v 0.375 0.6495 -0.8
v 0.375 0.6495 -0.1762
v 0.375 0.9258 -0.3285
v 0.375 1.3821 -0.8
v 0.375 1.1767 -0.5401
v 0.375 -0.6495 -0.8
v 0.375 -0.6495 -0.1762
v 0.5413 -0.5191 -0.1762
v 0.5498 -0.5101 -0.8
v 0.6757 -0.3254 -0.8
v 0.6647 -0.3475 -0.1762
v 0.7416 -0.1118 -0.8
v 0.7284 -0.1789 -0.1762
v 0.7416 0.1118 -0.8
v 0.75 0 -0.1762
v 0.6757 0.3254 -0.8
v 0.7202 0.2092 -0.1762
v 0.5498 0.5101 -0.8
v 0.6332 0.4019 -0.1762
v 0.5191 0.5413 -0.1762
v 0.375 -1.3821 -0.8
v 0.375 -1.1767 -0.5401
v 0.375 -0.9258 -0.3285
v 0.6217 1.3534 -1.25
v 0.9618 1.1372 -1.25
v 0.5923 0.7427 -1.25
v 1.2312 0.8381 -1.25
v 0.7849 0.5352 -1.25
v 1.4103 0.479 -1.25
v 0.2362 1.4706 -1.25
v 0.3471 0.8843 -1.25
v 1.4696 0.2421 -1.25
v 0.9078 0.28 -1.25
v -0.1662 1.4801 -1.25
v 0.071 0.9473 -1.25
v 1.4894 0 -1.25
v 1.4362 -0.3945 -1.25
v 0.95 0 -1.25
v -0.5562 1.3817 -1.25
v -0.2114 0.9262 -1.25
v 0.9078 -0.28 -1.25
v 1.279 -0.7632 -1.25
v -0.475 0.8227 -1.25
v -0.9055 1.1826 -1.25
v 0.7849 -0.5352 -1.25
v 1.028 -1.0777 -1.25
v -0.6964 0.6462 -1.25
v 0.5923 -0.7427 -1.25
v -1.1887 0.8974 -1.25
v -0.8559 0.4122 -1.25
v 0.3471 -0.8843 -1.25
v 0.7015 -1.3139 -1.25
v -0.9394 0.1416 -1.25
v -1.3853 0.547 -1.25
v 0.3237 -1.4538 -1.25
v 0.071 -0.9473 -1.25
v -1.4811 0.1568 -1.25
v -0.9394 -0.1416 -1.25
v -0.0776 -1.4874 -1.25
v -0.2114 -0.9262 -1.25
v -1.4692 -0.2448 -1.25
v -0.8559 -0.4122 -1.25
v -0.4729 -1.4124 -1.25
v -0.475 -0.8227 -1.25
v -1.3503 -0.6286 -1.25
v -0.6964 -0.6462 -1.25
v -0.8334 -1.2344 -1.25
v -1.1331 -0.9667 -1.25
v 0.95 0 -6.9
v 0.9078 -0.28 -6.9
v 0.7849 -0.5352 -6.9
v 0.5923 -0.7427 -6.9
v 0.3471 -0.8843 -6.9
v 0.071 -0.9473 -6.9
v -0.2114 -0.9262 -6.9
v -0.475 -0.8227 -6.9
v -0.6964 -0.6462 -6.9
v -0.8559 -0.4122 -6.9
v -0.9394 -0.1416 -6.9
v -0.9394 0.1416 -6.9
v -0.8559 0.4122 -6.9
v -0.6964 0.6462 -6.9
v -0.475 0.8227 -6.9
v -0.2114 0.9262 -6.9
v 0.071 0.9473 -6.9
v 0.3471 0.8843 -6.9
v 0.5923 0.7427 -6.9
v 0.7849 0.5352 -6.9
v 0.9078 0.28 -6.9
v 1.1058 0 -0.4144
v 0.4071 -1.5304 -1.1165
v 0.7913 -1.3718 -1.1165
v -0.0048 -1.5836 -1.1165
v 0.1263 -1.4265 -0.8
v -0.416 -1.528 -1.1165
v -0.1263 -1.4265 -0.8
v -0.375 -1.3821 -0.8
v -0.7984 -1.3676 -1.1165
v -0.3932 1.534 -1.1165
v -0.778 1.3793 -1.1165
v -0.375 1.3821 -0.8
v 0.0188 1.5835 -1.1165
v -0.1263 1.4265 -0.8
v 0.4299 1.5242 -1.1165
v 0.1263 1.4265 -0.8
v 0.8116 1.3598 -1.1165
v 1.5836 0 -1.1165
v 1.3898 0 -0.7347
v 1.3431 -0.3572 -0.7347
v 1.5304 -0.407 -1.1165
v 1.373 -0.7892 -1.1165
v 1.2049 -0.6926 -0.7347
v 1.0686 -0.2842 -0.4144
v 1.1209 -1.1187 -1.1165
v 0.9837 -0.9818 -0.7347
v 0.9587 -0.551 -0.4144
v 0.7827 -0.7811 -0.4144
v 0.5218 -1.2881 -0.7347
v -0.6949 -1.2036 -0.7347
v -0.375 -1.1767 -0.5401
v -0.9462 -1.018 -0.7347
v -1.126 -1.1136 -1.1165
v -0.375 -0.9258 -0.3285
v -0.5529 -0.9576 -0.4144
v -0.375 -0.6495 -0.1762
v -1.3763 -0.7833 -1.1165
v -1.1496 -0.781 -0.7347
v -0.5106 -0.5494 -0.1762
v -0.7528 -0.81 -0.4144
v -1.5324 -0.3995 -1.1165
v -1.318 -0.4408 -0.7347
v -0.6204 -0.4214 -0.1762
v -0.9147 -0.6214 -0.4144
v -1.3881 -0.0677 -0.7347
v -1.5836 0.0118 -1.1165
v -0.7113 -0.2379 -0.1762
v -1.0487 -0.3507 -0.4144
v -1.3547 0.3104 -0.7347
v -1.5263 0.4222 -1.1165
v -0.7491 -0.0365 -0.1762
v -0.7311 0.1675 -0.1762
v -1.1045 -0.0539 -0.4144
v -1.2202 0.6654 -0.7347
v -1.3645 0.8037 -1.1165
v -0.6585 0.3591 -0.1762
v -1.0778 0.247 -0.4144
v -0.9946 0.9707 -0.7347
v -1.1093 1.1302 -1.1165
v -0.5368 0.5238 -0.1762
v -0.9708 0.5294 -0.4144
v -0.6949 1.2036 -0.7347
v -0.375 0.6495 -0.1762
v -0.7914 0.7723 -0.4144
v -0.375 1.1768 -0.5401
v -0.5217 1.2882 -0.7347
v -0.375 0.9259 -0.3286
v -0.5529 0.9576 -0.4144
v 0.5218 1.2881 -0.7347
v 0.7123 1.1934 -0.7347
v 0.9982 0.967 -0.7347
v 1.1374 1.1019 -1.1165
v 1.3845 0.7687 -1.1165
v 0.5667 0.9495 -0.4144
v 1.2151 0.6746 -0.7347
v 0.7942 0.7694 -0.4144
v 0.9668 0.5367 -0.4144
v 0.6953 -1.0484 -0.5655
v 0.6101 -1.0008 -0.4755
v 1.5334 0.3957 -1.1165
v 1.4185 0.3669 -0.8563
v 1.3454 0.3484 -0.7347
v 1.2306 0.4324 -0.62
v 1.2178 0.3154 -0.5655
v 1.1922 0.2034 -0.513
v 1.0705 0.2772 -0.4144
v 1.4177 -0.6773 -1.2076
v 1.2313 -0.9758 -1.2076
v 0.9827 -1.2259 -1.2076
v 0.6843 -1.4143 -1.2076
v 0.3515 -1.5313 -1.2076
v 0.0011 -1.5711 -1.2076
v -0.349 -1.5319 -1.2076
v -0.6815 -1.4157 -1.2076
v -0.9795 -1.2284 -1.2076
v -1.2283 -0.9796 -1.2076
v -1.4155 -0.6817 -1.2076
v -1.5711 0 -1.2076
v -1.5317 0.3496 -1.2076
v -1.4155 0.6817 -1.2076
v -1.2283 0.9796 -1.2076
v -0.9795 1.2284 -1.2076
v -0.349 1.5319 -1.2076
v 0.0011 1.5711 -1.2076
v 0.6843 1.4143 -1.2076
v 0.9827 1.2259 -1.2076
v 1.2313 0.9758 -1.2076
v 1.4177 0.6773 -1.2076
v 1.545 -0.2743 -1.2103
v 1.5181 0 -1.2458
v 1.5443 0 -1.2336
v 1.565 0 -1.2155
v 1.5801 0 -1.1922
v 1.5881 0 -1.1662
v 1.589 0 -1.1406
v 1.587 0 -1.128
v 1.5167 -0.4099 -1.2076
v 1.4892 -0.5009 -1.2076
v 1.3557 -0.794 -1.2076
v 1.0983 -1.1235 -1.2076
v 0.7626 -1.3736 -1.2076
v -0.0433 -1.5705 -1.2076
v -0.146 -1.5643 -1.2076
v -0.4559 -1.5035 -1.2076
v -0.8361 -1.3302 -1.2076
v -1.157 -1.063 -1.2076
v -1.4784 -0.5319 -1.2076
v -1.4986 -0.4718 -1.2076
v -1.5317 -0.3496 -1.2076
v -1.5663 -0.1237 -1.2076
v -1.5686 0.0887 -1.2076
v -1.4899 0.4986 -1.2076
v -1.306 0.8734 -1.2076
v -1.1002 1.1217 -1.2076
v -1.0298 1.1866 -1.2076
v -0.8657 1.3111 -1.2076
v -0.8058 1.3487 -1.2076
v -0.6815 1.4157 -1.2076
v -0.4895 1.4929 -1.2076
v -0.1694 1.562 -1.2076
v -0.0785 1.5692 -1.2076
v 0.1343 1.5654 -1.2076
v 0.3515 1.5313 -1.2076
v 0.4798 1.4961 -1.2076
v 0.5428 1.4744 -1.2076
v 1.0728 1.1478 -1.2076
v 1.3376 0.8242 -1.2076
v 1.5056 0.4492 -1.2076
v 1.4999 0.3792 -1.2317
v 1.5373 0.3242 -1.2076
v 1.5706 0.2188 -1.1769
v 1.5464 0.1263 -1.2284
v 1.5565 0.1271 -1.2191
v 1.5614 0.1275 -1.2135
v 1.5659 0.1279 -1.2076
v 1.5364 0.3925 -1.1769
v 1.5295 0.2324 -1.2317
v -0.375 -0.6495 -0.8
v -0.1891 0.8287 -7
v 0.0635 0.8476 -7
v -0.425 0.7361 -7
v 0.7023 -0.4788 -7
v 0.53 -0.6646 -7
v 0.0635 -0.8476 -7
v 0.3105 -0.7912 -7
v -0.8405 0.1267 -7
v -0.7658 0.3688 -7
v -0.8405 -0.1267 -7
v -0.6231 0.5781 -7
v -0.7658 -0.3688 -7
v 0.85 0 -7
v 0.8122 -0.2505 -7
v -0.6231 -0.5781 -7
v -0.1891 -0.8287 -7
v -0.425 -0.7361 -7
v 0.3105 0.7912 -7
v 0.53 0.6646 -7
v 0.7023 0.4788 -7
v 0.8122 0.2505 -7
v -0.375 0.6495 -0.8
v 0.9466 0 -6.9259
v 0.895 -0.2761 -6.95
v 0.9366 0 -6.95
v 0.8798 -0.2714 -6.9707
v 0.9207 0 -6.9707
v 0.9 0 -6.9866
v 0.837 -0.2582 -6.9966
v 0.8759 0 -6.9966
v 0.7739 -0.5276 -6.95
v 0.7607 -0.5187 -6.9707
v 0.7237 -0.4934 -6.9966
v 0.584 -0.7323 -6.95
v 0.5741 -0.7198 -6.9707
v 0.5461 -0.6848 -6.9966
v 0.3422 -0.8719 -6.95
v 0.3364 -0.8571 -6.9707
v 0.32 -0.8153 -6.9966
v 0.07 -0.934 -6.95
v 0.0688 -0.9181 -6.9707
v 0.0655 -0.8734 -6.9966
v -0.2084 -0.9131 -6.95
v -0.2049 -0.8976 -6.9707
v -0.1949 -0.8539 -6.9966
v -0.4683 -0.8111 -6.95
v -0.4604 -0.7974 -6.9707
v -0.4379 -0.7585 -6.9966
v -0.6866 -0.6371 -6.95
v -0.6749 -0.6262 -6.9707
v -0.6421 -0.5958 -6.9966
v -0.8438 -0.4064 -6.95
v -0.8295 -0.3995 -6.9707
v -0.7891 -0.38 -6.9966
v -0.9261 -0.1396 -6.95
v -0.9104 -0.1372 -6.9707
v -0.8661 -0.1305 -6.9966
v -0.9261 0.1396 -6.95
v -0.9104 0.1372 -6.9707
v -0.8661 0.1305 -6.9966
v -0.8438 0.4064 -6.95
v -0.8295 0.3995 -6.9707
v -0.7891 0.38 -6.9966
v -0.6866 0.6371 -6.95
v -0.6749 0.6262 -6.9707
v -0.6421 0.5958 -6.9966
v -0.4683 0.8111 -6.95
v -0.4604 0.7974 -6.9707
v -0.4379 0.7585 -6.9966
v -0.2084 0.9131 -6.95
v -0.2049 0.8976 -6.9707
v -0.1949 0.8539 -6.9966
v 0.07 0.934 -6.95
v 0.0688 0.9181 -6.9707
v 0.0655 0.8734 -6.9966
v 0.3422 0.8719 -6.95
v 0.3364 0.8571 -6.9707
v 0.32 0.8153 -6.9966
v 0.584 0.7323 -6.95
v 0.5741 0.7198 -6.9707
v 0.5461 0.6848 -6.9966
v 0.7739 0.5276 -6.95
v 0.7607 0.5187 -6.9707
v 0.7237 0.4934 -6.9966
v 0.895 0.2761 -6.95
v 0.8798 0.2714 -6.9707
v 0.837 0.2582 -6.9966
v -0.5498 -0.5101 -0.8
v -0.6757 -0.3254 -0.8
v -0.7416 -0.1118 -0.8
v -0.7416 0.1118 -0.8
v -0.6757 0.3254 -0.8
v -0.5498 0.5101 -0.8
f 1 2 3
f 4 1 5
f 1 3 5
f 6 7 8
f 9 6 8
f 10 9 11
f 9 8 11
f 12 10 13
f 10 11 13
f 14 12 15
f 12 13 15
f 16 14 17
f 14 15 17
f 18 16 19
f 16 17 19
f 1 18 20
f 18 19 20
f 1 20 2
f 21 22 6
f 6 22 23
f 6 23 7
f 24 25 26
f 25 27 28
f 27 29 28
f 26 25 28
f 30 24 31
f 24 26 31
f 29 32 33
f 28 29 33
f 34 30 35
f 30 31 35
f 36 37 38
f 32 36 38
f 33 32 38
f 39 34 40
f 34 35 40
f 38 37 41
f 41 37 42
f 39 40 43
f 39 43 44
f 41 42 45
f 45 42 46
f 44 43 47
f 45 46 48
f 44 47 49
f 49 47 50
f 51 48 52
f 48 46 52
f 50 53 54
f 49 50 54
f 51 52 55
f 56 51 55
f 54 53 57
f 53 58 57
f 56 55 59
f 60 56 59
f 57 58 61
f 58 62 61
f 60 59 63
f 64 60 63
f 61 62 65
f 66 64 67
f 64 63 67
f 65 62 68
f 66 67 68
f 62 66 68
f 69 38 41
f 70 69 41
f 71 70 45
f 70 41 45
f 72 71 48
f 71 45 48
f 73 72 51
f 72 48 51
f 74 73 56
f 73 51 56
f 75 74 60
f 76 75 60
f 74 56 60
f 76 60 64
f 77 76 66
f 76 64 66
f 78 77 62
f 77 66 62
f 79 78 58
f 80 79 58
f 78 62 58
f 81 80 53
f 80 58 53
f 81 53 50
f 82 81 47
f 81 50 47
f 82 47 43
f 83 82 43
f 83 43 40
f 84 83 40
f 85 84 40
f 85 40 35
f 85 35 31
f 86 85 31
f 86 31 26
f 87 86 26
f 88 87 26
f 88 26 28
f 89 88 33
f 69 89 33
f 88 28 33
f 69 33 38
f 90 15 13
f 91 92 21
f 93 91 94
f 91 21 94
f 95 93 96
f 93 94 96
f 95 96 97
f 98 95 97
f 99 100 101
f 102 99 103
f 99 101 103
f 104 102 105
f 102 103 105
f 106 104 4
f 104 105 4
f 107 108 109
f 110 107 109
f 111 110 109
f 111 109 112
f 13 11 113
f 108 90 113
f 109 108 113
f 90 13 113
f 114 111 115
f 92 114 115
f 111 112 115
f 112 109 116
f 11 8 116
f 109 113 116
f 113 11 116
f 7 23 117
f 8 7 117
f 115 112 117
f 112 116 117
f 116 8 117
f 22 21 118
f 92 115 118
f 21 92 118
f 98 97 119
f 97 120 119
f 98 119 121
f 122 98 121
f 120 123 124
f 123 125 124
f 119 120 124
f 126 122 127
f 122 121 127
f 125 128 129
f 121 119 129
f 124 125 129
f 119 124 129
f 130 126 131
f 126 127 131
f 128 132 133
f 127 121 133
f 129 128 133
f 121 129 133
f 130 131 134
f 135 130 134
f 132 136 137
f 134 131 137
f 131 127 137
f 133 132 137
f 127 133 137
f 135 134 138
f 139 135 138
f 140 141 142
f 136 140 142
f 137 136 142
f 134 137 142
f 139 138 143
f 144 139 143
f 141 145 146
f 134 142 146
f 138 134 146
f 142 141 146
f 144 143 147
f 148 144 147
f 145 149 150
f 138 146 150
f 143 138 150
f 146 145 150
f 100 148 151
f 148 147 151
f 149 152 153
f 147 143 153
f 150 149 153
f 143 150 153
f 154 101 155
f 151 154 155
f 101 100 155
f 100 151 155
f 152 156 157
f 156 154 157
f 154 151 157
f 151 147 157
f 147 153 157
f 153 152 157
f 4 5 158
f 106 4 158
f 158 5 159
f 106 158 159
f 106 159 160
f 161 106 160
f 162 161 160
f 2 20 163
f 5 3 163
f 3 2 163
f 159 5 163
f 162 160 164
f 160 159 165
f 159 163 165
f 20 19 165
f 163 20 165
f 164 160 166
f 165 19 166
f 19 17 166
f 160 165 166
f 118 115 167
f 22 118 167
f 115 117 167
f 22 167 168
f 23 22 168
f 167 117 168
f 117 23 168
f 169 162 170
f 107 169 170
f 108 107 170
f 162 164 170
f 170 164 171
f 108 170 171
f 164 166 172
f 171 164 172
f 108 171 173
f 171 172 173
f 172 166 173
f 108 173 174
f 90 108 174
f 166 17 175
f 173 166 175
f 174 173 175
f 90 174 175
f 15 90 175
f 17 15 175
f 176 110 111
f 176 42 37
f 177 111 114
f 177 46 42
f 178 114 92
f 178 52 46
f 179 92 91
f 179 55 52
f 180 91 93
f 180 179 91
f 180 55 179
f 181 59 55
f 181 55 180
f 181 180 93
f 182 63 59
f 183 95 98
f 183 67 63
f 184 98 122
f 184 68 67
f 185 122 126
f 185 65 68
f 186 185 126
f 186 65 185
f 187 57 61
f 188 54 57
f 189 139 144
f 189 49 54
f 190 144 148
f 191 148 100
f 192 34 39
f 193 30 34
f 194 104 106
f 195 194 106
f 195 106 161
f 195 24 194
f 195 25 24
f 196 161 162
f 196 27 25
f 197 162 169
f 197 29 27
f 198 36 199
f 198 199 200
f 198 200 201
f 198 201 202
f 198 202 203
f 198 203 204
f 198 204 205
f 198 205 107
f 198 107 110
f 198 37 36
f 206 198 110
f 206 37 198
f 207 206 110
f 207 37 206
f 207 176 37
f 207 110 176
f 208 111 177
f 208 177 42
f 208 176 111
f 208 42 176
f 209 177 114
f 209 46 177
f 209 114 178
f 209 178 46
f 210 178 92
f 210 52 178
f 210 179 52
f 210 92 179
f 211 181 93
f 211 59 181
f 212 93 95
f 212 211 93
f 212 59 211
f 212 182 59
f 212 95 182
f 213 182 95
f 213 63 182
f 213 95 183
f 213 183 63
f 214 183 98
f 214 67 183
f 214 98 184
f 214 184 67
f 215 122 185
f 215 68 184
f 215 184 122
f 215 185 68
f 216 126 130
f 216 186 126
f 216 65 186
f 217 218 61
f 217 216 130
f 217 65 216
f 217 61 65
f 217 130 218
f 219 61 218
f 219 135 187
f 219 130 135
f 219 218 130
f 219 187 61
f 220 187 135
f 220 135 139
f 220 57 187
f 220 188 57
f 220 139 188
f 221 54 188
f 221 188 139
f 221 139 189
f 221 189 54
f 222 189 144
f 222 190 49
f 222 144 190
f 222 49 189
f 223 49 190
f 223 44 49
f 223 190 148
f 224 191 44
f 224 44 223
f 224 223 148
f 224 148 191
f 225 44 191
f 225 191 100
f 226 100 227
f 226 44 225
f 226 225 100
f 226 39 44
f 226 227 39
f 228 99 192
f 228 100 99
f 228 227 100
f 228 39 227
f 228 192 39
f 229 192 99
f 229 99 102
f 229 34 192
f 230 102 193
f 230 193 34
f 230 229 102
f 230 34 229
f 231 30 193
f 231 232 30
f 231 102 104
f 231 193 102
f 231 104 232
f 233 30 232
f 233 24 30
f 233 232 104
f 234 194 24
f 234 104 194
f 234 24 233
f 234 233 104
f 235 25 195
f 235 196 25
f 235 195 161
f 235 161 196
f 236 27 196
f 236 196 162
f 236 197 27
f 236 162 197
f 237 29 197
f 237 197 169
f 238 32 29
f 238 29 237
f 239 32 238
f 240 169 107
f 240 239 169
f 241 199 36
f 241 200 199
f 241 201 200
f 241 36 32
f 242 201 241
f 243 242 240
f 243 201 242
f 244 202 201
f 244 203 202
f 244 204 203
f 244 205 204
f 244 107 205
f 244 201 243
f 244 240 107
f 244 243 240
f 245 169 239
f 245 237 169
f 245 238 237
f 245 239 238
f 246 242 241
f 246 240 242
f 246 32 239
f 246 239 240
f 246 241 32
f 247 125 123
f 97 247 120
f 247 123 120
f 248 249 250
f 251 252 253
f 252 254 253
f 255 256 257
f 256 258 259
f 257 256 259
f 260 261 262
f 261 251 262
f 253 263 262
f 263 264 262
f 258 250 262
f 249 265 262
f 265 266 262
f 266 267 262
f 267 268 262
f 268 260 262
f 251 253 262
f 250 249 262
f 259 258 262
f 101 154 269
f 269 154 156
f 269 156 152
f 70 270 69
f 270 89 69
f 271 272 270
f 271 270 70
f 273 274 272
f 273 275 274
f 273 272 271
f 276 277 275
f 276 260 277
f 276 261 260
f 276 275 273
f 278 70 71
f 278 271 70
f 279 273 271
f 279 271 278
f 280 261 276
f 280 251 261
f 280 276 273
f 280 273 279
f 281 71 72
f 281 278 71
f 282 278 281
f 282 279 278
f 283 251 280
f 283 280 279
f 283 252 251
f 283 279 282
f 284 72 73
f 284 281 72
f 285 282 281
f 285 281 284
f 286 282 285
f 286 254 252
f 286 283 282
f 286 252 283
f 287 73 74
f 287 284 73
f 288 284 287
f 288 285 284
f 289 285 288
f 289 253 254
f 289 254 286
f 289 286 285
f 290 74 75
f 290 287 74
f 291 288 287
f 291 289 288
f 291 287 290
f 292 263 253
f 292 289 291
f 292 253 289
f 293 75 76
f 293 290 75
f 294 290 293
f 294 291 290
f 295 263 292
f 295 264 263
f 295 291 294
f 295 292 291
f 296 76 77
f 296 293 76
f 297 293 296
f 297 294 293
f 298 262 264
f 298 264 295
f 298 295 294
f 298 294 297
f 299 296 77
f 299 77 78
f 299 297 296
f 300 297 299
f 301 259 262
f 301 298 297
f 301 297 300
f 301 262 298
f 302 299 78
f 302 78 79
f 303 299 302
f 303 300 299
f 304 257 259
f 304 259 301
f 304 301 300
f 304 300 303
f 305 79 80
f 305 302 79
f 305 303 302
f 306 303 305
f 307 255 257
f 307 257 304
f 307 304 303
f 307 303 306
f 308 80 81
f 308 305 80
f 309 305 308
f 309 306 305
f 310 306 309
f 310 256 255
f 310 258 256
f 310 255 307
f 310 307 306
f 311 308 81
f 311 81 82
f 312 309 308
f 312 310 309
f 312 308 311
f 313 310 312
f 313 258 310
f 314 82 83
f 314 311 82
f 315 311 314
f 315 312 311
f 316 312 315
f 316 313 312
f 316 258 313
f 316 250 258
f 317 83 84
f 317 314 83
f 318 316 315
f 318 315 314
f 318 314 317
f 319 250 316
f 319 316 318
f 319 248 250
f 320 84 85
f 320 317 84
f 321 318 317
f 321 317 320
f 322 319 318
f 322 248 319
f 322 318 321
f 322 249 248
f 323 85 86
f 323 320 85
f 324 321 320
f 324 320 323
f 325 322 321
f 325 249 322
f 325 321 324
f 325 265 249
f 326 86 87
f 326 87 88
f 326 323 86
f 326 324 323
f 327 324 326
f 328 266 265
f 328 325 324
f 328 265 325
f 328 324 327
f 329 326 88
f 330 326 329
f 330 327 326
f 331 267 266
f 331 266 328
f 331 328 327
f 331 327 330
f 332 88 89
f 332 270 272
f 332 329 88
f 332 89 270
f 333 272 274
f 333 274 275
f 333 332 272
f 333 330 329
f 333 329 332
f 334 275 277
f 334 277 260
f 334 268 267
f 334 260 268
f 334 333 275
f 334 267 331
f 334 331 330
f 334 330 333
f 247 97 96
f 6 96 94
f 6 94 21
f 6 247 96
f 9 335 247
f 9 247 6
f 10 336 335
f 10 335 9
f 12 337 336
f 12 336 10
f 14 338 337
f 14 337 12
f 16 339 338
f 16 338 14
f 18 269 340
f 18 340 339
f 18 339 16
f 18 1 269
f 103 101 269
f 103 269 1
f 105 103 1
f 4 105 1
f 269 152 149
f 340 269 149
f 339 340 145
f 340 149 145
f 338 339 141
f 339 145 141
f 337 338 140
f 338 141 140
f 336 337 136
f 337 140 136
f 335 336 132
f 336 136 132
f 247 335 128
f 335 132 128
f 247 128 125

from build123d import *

# Parameters (mm, degrees)
CUT_EXTRUDE1_DEPTH = 0.8
FILLET1_R          = 0.1
FILLET2_R          = 0.1


with BuildPart() as part:
    # Sketch1 → Revolve1 (revolve)
    with BuildSketch(Plane(origin=(0, 0, 0), x_dir=(0, 0, -1), z_dir=(1, 0, 0)), mode=Mode.PRIVATE) as revolve1_sk:
        with BuildLine():
            Line((0, 0), (7, 0))
            Line((7, 0), (7, 0.95))
            Line((7, 0.95), (1.25, 0.95))
            Line((1.25, 0.95), (1.25, 1.625))
            ThreePointArc((1.25, 1.625), (0.348391423, 1.025275828), (0, 0))
        make_face()
    revolve(revolve1_sk.sketch.rotate(Axis((0, 0, 0), (0, 0, -1)), 90), axis=Axis((0, 0, 0), (0, 0, -1)))

    # Sketch2 → Cut-Extrude1 (cut)
    with BuildSketch(Plane.XY):
        with BuildLine():
            Line((-0.375, -2.059291796), (0.375, -2.059291796))
            Line((0.375, -2.059291796), (0.375, -0.649519053))
            ThreePointArc((0.375, -0.649519053), (0.75, 0), (0.375, 0.649519053))
            Line((0.375, 0.649519053), (0.375, 2.059291796))
            Line((0.375, 2.059291796), (-0.375, 2.059291796))
            Line((-0.375, 2.059291796), (-0.375, 0.649519053))
            ThreePointArc((-0.375, 0.649519053), (-0.75, 0), (-0.375, -0.649519053))
            Line((-0.375, -0.649519053), (-0.375, -2.059291796))
        make_face()
    extrude(amount=-CUT_EXTRUDE1_DEPTH, mode=Mode.SUBTRACT)

    # Fillet1
    fillet1_edges = [part.edges().sort_by_distance(p)[0] for p in [
        (-1.625, 0, -1.25),
    ]]
    fillet(fillet1_edges, radius=FILLET1_R)

    # Fillet2
    fillet2_edges = [part.edges().sort_by_distance(p)[0] for p in [
        (-0.95, 0, -7),
    ]]
    fillet(fillet2_edges, radius=FILLET2_R)


solid = part.part
